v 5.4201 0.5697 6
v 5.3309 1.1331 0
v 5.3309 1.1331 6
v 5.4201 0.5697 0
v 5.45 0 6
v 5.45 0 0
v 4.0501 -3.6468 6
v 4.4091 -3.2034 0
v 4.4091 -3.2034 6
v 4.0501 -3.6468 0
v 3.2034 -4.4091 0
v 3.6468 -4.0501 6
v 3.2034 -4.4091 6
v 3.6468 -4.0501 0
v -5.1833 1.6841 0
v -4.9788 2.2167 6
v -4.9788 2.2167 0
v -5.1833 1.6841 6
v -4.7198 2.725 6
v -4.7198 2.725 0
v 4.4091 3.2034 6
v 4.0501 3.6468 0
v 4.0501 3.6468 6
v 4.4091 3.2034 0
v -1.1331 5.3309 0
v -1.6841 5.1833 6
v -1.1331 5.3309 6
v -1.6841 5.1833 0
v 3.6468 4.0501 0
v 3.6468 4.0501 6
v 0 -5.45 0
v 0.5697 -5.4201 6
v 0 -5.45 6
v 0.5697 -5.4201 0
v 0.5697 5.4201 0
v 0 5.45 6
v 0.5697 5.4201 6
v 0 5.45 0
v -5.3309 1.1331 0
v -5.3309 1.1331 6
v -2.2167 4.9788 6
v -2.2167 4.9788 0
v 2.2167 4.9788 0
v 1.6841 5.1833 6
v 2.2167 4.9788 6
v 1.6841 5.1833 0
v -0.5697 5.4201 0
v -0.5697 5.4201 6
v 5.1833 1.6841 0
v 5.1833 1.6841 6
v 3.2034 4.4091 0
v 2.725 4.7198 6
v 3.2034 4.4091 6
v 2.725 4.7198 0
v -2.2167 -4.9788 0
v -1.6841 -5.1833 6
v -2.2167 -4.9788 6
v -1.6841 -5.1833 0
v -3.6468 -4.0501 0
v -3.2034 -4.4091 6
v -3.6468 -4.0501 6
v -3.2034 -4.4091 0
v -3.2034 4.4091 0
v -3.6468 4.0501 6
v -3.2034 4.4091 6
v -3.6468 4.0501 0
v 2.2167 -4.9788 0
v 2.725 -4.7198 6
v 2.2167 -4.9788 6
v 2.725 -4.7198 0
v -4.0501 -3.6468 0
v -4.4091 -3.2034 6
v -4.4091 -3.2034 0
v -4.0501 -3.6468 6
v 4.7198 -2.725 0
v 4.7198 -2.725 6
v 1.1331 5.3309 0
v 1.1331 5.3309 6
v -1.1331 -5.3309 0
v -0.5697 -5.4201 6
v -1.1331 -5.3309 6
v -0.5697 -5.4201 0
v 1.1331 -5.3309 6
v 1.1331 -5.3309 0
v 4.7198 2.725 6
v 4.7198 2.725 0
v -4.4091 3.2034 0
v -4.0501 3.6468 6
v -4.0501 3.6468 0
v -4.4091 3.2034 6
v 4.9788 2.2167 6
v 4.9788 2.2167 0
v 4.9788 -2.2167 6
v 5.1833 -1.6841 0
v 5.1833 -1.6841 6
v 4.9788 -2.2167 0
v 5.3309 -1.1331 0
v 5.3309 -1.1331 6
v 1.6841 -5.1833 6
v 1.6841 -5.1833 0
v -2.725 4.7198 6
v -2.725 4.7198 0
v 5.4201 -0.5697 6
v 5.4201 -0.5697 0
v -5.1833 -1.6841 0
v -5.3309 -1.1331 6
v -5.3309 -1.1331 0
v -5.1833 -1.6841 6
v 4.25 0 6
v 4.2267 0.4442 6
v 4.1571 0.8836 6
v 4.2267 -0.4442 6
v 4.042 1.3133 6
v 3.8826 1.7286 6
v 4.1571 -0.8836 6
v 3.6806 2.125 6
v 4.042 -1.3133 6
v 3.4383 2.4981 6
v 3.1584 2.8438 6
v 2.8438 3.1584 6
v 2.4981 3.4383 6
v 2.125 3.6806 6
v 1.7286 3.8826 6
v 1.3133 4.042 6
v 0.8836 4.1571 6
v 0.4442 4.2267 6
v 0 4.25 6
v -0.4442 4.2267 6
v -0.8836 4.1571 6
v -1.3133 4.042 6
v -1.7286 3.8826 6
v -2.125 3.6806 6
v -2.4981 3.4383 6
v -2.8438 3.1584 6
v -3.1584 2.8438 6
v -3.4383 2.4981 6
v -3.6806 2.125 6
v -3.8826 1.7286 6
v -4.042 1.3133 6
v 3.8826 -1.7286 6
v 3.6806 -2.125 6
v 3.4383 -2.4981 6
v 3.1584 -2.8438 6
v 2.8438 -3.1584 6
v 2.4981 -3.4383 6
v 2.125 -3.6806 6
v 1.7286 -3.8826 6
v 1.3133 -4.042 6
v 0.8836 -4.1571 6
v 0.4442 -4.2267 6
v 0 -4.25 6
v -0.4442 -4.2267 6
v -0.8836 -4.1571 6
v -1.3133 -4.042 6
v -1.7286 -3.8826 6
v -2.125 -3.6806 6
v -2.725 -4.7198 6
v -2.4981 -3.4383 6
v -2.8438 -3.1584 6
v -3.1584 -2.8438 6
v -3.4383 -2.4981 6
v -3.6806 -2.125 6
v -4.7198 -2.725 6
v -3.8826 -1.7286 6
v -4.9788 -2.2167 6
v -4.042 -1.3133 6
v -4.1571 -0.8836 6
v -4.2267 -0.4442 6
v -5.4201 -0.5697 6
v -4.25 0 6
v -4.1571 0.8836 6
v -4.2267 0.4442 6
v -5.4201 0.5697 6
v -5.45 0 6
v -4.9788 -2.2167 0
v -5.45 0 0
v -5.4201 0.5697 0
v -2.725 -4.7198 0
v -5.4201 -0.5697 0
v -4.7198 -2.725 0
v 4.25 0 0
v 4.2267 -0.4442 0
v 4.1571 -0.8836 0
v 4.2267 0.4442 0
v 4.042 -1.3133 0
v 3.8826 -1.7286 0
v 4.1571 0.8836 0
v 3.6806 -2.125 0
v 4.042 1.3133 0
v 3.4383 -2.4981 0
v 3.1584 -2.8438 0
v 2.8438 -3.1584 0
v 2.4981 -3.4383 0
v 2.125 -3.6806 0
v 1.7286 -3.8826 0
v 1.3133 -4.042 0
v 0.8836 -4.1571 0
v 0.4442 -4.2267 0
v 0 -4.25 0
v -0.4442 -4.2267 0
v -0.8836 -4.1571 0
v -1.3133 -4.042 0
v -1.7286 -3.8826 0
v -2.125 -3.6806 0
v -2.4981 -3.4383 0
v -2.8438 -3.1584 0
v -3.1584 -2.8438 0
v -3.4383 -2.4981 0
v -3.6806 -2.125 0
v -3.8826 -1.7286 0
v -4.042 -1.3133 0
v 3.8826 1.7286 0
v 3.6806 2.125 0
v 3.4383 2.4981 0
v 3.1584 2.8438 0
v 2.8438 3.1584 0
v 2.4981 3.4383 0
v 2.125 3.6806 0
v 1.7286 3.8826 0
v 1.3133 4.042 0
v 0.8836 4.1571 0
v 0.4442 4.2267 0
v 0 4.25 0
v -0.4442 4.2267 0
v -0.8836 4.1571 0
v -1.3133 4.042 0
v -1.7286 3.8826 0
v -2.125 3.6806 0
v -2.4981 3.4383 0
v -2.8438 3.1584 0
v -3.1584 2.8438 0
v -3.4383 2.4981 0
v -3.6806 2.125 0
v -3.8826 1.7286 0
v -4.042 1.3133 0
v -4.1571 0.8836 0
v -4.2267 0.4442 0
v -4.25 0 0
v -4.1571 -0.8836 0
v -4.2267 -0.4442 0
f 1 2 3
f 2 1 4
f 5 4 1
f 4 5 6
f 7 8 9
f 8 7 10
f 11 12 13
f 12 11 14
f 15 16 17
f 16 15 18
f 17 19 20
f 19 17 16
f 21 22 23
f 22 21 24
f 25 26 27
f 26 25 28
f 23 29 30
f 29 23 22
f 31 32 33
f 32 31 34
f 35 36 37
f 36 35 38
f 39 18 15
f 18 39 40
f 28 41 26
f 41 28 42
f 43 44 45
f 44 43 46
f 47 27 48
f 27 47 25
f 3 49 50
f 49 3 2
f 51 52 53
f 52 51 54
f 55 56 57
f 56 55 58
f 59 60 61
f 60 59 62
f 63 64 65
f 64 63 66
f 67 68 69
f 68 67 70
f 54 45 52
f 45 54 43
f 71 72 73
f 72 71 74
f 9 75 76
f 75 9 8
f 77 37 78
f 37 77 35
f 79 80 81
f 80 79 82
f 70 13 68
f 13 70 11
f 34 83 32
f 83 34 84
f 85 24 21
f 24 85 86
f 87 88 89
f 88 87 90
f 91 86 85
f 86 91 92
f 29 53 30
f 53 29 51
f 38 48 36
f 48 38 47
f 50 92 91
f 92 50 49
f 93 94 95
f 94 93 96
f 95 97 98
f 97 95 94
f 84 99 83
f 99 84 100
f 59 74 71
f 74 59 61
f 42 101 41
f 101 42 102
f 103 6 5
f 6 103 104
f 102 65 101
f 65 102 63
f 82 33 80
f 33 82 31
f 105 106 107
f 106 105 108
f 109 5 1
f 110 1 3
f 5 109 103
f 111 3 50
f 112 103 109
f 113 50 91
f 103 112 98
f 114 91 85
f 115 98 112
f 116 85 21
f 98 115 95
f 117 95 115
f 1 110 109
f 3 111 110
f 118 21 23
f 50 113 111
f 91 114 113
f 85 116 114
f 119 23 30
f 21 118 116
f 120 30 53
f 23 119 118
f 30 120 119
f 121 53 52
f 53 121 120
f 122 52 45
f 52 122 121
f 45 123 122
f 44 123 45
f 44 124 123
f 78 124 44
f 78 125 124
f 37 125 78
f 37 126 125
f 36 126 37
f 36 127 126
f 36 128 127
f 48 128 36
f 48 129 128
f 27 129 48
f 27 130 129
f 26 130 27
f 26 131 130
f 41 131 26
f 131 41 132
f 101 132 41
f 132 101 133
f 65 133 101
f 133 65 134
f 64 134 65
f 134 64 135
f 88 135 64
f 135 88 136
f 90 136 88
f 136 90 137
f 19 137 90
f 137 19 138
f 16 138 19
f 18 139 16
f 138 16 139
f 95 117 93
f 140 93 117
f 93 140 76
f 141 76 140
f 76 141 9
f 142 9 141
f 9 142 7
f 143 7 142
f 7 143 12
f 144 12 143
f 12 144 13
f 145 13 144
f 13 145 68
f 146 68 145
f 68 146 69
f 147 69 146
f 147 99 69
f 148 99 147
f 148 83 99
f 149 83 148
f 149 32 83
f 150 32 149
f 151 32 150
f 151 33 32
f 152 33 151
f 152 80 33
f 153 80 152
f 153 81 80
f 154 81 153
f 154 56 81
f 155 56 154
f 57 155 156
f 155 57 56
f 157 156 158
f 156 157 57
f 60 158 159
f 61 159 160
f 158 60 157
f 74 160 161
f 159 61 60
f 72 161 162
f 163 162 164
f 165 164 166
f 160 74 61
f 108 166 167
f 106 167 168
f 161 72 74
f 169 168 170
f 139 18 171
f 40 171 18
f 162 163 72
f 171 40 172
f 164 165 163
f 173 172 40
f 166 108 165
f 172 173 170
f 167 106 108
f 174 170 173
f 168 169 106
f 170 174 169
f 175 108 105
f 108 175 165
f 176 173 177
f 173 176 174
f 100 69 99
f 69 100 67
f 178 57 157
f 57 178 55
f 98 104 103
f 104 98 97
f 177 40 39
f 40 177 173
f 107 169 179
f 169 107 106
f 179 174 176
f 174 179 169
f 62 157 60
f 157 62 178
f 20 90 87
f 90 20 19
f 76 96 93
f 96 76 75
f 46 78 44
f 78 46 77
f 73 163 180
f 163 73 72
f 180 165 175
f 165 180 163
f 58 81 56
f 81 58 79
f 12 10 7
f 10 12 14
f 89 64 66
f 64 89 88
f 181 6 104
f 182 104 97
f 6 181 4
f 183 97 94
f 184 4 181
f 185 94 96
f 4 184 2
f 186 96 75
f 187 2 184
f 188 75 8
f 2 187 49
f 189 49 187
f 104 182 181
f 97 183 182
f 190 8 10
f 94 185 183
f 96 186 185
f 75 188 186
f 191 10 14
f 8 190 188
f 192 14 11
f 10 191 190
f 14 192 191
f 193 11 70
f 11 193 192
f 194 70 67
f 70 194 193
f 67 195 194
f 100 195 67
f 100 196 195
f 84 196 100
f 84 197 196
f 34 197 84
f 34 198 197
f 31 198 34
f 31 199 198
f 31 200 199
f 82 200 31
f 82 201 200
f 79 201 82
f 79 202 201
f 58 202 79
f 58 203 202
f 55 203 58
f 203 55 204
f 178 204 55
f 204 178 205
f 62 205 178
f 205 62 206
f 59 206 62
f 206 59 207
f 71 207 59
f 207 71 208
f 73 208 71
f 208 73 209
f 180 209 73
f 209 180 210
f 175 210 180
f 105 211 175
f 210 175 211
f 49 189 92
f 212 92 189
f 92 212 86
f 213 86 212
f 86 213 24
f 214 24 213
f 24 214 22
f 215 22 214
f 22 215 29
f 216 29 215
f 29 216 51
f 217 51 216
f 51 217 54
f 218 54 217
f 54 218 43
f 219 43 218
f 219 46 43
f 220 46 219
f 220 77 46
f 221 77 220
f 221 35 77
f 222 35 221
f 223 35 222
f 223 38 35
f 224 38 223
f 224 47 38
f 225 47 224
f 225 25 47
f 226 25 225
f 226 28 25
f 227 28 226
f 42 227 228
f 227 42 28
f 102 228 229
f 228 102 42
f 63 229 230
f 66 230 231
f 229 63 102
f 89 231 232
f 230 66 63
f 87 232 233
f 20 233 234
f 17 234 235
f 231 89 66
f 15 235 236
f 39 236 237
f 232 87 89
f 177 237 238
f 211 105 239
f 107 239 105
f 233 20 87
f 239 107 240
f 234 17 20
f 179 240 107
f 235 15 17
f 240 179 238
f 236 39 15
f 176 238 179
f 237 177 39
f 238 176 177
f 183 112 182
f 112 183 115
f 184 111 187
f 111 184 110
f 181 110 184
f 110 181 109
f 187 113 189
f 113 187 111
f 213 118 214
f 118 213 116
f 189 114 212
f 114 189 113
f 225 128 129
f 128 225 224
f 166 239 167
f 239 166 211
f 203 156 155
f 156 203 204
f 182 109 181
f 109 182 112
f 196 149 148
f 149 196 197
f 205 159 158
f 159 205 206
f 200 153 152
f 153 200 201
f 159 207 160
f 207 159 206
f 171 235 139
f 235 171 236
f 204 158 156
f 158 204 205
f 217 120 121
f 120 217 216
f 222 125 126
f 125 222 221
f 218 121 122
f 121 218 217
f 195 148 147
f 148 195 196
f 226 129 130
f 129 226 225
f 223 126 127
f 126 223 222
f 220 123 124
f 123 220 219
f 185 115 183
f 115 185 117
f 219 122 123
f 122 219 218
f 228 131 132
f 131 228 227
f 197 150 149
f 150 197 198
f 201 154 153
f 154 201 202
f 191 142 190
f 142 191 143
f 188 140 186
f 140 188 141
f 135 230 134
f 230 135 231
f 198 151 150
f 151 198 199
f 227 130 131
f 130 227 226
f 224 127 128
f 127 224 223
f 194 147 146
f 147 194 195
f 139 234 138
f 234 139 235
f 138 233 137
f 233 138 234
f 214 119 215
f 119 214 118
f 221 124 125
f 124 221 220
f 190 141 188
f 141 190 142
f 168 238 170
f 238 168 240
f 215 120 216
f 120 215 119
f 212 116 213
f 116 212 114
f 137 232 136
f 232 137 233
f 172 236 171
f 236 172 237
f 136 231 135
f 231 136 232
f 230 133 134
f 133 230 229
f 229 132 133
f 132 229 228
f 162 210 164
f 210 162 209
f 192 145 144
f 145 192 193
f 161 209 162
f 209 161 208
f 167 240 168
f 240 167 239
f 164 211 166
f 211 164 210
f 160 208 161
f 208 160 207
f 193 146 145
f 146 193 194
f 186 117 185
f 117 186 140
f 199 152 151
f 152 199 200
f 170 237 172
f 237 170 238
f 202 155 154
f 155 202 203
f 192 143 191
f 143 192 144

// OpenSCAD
//

$fs=0.1;
$fa=6;
in_d = 8.5;
out_d = in_d+0.4*2*3;
hh= 6;

difference() {
    cylinder(d=out_d, h=hh);
    cylinder(d=in_d, h=hh);
}
